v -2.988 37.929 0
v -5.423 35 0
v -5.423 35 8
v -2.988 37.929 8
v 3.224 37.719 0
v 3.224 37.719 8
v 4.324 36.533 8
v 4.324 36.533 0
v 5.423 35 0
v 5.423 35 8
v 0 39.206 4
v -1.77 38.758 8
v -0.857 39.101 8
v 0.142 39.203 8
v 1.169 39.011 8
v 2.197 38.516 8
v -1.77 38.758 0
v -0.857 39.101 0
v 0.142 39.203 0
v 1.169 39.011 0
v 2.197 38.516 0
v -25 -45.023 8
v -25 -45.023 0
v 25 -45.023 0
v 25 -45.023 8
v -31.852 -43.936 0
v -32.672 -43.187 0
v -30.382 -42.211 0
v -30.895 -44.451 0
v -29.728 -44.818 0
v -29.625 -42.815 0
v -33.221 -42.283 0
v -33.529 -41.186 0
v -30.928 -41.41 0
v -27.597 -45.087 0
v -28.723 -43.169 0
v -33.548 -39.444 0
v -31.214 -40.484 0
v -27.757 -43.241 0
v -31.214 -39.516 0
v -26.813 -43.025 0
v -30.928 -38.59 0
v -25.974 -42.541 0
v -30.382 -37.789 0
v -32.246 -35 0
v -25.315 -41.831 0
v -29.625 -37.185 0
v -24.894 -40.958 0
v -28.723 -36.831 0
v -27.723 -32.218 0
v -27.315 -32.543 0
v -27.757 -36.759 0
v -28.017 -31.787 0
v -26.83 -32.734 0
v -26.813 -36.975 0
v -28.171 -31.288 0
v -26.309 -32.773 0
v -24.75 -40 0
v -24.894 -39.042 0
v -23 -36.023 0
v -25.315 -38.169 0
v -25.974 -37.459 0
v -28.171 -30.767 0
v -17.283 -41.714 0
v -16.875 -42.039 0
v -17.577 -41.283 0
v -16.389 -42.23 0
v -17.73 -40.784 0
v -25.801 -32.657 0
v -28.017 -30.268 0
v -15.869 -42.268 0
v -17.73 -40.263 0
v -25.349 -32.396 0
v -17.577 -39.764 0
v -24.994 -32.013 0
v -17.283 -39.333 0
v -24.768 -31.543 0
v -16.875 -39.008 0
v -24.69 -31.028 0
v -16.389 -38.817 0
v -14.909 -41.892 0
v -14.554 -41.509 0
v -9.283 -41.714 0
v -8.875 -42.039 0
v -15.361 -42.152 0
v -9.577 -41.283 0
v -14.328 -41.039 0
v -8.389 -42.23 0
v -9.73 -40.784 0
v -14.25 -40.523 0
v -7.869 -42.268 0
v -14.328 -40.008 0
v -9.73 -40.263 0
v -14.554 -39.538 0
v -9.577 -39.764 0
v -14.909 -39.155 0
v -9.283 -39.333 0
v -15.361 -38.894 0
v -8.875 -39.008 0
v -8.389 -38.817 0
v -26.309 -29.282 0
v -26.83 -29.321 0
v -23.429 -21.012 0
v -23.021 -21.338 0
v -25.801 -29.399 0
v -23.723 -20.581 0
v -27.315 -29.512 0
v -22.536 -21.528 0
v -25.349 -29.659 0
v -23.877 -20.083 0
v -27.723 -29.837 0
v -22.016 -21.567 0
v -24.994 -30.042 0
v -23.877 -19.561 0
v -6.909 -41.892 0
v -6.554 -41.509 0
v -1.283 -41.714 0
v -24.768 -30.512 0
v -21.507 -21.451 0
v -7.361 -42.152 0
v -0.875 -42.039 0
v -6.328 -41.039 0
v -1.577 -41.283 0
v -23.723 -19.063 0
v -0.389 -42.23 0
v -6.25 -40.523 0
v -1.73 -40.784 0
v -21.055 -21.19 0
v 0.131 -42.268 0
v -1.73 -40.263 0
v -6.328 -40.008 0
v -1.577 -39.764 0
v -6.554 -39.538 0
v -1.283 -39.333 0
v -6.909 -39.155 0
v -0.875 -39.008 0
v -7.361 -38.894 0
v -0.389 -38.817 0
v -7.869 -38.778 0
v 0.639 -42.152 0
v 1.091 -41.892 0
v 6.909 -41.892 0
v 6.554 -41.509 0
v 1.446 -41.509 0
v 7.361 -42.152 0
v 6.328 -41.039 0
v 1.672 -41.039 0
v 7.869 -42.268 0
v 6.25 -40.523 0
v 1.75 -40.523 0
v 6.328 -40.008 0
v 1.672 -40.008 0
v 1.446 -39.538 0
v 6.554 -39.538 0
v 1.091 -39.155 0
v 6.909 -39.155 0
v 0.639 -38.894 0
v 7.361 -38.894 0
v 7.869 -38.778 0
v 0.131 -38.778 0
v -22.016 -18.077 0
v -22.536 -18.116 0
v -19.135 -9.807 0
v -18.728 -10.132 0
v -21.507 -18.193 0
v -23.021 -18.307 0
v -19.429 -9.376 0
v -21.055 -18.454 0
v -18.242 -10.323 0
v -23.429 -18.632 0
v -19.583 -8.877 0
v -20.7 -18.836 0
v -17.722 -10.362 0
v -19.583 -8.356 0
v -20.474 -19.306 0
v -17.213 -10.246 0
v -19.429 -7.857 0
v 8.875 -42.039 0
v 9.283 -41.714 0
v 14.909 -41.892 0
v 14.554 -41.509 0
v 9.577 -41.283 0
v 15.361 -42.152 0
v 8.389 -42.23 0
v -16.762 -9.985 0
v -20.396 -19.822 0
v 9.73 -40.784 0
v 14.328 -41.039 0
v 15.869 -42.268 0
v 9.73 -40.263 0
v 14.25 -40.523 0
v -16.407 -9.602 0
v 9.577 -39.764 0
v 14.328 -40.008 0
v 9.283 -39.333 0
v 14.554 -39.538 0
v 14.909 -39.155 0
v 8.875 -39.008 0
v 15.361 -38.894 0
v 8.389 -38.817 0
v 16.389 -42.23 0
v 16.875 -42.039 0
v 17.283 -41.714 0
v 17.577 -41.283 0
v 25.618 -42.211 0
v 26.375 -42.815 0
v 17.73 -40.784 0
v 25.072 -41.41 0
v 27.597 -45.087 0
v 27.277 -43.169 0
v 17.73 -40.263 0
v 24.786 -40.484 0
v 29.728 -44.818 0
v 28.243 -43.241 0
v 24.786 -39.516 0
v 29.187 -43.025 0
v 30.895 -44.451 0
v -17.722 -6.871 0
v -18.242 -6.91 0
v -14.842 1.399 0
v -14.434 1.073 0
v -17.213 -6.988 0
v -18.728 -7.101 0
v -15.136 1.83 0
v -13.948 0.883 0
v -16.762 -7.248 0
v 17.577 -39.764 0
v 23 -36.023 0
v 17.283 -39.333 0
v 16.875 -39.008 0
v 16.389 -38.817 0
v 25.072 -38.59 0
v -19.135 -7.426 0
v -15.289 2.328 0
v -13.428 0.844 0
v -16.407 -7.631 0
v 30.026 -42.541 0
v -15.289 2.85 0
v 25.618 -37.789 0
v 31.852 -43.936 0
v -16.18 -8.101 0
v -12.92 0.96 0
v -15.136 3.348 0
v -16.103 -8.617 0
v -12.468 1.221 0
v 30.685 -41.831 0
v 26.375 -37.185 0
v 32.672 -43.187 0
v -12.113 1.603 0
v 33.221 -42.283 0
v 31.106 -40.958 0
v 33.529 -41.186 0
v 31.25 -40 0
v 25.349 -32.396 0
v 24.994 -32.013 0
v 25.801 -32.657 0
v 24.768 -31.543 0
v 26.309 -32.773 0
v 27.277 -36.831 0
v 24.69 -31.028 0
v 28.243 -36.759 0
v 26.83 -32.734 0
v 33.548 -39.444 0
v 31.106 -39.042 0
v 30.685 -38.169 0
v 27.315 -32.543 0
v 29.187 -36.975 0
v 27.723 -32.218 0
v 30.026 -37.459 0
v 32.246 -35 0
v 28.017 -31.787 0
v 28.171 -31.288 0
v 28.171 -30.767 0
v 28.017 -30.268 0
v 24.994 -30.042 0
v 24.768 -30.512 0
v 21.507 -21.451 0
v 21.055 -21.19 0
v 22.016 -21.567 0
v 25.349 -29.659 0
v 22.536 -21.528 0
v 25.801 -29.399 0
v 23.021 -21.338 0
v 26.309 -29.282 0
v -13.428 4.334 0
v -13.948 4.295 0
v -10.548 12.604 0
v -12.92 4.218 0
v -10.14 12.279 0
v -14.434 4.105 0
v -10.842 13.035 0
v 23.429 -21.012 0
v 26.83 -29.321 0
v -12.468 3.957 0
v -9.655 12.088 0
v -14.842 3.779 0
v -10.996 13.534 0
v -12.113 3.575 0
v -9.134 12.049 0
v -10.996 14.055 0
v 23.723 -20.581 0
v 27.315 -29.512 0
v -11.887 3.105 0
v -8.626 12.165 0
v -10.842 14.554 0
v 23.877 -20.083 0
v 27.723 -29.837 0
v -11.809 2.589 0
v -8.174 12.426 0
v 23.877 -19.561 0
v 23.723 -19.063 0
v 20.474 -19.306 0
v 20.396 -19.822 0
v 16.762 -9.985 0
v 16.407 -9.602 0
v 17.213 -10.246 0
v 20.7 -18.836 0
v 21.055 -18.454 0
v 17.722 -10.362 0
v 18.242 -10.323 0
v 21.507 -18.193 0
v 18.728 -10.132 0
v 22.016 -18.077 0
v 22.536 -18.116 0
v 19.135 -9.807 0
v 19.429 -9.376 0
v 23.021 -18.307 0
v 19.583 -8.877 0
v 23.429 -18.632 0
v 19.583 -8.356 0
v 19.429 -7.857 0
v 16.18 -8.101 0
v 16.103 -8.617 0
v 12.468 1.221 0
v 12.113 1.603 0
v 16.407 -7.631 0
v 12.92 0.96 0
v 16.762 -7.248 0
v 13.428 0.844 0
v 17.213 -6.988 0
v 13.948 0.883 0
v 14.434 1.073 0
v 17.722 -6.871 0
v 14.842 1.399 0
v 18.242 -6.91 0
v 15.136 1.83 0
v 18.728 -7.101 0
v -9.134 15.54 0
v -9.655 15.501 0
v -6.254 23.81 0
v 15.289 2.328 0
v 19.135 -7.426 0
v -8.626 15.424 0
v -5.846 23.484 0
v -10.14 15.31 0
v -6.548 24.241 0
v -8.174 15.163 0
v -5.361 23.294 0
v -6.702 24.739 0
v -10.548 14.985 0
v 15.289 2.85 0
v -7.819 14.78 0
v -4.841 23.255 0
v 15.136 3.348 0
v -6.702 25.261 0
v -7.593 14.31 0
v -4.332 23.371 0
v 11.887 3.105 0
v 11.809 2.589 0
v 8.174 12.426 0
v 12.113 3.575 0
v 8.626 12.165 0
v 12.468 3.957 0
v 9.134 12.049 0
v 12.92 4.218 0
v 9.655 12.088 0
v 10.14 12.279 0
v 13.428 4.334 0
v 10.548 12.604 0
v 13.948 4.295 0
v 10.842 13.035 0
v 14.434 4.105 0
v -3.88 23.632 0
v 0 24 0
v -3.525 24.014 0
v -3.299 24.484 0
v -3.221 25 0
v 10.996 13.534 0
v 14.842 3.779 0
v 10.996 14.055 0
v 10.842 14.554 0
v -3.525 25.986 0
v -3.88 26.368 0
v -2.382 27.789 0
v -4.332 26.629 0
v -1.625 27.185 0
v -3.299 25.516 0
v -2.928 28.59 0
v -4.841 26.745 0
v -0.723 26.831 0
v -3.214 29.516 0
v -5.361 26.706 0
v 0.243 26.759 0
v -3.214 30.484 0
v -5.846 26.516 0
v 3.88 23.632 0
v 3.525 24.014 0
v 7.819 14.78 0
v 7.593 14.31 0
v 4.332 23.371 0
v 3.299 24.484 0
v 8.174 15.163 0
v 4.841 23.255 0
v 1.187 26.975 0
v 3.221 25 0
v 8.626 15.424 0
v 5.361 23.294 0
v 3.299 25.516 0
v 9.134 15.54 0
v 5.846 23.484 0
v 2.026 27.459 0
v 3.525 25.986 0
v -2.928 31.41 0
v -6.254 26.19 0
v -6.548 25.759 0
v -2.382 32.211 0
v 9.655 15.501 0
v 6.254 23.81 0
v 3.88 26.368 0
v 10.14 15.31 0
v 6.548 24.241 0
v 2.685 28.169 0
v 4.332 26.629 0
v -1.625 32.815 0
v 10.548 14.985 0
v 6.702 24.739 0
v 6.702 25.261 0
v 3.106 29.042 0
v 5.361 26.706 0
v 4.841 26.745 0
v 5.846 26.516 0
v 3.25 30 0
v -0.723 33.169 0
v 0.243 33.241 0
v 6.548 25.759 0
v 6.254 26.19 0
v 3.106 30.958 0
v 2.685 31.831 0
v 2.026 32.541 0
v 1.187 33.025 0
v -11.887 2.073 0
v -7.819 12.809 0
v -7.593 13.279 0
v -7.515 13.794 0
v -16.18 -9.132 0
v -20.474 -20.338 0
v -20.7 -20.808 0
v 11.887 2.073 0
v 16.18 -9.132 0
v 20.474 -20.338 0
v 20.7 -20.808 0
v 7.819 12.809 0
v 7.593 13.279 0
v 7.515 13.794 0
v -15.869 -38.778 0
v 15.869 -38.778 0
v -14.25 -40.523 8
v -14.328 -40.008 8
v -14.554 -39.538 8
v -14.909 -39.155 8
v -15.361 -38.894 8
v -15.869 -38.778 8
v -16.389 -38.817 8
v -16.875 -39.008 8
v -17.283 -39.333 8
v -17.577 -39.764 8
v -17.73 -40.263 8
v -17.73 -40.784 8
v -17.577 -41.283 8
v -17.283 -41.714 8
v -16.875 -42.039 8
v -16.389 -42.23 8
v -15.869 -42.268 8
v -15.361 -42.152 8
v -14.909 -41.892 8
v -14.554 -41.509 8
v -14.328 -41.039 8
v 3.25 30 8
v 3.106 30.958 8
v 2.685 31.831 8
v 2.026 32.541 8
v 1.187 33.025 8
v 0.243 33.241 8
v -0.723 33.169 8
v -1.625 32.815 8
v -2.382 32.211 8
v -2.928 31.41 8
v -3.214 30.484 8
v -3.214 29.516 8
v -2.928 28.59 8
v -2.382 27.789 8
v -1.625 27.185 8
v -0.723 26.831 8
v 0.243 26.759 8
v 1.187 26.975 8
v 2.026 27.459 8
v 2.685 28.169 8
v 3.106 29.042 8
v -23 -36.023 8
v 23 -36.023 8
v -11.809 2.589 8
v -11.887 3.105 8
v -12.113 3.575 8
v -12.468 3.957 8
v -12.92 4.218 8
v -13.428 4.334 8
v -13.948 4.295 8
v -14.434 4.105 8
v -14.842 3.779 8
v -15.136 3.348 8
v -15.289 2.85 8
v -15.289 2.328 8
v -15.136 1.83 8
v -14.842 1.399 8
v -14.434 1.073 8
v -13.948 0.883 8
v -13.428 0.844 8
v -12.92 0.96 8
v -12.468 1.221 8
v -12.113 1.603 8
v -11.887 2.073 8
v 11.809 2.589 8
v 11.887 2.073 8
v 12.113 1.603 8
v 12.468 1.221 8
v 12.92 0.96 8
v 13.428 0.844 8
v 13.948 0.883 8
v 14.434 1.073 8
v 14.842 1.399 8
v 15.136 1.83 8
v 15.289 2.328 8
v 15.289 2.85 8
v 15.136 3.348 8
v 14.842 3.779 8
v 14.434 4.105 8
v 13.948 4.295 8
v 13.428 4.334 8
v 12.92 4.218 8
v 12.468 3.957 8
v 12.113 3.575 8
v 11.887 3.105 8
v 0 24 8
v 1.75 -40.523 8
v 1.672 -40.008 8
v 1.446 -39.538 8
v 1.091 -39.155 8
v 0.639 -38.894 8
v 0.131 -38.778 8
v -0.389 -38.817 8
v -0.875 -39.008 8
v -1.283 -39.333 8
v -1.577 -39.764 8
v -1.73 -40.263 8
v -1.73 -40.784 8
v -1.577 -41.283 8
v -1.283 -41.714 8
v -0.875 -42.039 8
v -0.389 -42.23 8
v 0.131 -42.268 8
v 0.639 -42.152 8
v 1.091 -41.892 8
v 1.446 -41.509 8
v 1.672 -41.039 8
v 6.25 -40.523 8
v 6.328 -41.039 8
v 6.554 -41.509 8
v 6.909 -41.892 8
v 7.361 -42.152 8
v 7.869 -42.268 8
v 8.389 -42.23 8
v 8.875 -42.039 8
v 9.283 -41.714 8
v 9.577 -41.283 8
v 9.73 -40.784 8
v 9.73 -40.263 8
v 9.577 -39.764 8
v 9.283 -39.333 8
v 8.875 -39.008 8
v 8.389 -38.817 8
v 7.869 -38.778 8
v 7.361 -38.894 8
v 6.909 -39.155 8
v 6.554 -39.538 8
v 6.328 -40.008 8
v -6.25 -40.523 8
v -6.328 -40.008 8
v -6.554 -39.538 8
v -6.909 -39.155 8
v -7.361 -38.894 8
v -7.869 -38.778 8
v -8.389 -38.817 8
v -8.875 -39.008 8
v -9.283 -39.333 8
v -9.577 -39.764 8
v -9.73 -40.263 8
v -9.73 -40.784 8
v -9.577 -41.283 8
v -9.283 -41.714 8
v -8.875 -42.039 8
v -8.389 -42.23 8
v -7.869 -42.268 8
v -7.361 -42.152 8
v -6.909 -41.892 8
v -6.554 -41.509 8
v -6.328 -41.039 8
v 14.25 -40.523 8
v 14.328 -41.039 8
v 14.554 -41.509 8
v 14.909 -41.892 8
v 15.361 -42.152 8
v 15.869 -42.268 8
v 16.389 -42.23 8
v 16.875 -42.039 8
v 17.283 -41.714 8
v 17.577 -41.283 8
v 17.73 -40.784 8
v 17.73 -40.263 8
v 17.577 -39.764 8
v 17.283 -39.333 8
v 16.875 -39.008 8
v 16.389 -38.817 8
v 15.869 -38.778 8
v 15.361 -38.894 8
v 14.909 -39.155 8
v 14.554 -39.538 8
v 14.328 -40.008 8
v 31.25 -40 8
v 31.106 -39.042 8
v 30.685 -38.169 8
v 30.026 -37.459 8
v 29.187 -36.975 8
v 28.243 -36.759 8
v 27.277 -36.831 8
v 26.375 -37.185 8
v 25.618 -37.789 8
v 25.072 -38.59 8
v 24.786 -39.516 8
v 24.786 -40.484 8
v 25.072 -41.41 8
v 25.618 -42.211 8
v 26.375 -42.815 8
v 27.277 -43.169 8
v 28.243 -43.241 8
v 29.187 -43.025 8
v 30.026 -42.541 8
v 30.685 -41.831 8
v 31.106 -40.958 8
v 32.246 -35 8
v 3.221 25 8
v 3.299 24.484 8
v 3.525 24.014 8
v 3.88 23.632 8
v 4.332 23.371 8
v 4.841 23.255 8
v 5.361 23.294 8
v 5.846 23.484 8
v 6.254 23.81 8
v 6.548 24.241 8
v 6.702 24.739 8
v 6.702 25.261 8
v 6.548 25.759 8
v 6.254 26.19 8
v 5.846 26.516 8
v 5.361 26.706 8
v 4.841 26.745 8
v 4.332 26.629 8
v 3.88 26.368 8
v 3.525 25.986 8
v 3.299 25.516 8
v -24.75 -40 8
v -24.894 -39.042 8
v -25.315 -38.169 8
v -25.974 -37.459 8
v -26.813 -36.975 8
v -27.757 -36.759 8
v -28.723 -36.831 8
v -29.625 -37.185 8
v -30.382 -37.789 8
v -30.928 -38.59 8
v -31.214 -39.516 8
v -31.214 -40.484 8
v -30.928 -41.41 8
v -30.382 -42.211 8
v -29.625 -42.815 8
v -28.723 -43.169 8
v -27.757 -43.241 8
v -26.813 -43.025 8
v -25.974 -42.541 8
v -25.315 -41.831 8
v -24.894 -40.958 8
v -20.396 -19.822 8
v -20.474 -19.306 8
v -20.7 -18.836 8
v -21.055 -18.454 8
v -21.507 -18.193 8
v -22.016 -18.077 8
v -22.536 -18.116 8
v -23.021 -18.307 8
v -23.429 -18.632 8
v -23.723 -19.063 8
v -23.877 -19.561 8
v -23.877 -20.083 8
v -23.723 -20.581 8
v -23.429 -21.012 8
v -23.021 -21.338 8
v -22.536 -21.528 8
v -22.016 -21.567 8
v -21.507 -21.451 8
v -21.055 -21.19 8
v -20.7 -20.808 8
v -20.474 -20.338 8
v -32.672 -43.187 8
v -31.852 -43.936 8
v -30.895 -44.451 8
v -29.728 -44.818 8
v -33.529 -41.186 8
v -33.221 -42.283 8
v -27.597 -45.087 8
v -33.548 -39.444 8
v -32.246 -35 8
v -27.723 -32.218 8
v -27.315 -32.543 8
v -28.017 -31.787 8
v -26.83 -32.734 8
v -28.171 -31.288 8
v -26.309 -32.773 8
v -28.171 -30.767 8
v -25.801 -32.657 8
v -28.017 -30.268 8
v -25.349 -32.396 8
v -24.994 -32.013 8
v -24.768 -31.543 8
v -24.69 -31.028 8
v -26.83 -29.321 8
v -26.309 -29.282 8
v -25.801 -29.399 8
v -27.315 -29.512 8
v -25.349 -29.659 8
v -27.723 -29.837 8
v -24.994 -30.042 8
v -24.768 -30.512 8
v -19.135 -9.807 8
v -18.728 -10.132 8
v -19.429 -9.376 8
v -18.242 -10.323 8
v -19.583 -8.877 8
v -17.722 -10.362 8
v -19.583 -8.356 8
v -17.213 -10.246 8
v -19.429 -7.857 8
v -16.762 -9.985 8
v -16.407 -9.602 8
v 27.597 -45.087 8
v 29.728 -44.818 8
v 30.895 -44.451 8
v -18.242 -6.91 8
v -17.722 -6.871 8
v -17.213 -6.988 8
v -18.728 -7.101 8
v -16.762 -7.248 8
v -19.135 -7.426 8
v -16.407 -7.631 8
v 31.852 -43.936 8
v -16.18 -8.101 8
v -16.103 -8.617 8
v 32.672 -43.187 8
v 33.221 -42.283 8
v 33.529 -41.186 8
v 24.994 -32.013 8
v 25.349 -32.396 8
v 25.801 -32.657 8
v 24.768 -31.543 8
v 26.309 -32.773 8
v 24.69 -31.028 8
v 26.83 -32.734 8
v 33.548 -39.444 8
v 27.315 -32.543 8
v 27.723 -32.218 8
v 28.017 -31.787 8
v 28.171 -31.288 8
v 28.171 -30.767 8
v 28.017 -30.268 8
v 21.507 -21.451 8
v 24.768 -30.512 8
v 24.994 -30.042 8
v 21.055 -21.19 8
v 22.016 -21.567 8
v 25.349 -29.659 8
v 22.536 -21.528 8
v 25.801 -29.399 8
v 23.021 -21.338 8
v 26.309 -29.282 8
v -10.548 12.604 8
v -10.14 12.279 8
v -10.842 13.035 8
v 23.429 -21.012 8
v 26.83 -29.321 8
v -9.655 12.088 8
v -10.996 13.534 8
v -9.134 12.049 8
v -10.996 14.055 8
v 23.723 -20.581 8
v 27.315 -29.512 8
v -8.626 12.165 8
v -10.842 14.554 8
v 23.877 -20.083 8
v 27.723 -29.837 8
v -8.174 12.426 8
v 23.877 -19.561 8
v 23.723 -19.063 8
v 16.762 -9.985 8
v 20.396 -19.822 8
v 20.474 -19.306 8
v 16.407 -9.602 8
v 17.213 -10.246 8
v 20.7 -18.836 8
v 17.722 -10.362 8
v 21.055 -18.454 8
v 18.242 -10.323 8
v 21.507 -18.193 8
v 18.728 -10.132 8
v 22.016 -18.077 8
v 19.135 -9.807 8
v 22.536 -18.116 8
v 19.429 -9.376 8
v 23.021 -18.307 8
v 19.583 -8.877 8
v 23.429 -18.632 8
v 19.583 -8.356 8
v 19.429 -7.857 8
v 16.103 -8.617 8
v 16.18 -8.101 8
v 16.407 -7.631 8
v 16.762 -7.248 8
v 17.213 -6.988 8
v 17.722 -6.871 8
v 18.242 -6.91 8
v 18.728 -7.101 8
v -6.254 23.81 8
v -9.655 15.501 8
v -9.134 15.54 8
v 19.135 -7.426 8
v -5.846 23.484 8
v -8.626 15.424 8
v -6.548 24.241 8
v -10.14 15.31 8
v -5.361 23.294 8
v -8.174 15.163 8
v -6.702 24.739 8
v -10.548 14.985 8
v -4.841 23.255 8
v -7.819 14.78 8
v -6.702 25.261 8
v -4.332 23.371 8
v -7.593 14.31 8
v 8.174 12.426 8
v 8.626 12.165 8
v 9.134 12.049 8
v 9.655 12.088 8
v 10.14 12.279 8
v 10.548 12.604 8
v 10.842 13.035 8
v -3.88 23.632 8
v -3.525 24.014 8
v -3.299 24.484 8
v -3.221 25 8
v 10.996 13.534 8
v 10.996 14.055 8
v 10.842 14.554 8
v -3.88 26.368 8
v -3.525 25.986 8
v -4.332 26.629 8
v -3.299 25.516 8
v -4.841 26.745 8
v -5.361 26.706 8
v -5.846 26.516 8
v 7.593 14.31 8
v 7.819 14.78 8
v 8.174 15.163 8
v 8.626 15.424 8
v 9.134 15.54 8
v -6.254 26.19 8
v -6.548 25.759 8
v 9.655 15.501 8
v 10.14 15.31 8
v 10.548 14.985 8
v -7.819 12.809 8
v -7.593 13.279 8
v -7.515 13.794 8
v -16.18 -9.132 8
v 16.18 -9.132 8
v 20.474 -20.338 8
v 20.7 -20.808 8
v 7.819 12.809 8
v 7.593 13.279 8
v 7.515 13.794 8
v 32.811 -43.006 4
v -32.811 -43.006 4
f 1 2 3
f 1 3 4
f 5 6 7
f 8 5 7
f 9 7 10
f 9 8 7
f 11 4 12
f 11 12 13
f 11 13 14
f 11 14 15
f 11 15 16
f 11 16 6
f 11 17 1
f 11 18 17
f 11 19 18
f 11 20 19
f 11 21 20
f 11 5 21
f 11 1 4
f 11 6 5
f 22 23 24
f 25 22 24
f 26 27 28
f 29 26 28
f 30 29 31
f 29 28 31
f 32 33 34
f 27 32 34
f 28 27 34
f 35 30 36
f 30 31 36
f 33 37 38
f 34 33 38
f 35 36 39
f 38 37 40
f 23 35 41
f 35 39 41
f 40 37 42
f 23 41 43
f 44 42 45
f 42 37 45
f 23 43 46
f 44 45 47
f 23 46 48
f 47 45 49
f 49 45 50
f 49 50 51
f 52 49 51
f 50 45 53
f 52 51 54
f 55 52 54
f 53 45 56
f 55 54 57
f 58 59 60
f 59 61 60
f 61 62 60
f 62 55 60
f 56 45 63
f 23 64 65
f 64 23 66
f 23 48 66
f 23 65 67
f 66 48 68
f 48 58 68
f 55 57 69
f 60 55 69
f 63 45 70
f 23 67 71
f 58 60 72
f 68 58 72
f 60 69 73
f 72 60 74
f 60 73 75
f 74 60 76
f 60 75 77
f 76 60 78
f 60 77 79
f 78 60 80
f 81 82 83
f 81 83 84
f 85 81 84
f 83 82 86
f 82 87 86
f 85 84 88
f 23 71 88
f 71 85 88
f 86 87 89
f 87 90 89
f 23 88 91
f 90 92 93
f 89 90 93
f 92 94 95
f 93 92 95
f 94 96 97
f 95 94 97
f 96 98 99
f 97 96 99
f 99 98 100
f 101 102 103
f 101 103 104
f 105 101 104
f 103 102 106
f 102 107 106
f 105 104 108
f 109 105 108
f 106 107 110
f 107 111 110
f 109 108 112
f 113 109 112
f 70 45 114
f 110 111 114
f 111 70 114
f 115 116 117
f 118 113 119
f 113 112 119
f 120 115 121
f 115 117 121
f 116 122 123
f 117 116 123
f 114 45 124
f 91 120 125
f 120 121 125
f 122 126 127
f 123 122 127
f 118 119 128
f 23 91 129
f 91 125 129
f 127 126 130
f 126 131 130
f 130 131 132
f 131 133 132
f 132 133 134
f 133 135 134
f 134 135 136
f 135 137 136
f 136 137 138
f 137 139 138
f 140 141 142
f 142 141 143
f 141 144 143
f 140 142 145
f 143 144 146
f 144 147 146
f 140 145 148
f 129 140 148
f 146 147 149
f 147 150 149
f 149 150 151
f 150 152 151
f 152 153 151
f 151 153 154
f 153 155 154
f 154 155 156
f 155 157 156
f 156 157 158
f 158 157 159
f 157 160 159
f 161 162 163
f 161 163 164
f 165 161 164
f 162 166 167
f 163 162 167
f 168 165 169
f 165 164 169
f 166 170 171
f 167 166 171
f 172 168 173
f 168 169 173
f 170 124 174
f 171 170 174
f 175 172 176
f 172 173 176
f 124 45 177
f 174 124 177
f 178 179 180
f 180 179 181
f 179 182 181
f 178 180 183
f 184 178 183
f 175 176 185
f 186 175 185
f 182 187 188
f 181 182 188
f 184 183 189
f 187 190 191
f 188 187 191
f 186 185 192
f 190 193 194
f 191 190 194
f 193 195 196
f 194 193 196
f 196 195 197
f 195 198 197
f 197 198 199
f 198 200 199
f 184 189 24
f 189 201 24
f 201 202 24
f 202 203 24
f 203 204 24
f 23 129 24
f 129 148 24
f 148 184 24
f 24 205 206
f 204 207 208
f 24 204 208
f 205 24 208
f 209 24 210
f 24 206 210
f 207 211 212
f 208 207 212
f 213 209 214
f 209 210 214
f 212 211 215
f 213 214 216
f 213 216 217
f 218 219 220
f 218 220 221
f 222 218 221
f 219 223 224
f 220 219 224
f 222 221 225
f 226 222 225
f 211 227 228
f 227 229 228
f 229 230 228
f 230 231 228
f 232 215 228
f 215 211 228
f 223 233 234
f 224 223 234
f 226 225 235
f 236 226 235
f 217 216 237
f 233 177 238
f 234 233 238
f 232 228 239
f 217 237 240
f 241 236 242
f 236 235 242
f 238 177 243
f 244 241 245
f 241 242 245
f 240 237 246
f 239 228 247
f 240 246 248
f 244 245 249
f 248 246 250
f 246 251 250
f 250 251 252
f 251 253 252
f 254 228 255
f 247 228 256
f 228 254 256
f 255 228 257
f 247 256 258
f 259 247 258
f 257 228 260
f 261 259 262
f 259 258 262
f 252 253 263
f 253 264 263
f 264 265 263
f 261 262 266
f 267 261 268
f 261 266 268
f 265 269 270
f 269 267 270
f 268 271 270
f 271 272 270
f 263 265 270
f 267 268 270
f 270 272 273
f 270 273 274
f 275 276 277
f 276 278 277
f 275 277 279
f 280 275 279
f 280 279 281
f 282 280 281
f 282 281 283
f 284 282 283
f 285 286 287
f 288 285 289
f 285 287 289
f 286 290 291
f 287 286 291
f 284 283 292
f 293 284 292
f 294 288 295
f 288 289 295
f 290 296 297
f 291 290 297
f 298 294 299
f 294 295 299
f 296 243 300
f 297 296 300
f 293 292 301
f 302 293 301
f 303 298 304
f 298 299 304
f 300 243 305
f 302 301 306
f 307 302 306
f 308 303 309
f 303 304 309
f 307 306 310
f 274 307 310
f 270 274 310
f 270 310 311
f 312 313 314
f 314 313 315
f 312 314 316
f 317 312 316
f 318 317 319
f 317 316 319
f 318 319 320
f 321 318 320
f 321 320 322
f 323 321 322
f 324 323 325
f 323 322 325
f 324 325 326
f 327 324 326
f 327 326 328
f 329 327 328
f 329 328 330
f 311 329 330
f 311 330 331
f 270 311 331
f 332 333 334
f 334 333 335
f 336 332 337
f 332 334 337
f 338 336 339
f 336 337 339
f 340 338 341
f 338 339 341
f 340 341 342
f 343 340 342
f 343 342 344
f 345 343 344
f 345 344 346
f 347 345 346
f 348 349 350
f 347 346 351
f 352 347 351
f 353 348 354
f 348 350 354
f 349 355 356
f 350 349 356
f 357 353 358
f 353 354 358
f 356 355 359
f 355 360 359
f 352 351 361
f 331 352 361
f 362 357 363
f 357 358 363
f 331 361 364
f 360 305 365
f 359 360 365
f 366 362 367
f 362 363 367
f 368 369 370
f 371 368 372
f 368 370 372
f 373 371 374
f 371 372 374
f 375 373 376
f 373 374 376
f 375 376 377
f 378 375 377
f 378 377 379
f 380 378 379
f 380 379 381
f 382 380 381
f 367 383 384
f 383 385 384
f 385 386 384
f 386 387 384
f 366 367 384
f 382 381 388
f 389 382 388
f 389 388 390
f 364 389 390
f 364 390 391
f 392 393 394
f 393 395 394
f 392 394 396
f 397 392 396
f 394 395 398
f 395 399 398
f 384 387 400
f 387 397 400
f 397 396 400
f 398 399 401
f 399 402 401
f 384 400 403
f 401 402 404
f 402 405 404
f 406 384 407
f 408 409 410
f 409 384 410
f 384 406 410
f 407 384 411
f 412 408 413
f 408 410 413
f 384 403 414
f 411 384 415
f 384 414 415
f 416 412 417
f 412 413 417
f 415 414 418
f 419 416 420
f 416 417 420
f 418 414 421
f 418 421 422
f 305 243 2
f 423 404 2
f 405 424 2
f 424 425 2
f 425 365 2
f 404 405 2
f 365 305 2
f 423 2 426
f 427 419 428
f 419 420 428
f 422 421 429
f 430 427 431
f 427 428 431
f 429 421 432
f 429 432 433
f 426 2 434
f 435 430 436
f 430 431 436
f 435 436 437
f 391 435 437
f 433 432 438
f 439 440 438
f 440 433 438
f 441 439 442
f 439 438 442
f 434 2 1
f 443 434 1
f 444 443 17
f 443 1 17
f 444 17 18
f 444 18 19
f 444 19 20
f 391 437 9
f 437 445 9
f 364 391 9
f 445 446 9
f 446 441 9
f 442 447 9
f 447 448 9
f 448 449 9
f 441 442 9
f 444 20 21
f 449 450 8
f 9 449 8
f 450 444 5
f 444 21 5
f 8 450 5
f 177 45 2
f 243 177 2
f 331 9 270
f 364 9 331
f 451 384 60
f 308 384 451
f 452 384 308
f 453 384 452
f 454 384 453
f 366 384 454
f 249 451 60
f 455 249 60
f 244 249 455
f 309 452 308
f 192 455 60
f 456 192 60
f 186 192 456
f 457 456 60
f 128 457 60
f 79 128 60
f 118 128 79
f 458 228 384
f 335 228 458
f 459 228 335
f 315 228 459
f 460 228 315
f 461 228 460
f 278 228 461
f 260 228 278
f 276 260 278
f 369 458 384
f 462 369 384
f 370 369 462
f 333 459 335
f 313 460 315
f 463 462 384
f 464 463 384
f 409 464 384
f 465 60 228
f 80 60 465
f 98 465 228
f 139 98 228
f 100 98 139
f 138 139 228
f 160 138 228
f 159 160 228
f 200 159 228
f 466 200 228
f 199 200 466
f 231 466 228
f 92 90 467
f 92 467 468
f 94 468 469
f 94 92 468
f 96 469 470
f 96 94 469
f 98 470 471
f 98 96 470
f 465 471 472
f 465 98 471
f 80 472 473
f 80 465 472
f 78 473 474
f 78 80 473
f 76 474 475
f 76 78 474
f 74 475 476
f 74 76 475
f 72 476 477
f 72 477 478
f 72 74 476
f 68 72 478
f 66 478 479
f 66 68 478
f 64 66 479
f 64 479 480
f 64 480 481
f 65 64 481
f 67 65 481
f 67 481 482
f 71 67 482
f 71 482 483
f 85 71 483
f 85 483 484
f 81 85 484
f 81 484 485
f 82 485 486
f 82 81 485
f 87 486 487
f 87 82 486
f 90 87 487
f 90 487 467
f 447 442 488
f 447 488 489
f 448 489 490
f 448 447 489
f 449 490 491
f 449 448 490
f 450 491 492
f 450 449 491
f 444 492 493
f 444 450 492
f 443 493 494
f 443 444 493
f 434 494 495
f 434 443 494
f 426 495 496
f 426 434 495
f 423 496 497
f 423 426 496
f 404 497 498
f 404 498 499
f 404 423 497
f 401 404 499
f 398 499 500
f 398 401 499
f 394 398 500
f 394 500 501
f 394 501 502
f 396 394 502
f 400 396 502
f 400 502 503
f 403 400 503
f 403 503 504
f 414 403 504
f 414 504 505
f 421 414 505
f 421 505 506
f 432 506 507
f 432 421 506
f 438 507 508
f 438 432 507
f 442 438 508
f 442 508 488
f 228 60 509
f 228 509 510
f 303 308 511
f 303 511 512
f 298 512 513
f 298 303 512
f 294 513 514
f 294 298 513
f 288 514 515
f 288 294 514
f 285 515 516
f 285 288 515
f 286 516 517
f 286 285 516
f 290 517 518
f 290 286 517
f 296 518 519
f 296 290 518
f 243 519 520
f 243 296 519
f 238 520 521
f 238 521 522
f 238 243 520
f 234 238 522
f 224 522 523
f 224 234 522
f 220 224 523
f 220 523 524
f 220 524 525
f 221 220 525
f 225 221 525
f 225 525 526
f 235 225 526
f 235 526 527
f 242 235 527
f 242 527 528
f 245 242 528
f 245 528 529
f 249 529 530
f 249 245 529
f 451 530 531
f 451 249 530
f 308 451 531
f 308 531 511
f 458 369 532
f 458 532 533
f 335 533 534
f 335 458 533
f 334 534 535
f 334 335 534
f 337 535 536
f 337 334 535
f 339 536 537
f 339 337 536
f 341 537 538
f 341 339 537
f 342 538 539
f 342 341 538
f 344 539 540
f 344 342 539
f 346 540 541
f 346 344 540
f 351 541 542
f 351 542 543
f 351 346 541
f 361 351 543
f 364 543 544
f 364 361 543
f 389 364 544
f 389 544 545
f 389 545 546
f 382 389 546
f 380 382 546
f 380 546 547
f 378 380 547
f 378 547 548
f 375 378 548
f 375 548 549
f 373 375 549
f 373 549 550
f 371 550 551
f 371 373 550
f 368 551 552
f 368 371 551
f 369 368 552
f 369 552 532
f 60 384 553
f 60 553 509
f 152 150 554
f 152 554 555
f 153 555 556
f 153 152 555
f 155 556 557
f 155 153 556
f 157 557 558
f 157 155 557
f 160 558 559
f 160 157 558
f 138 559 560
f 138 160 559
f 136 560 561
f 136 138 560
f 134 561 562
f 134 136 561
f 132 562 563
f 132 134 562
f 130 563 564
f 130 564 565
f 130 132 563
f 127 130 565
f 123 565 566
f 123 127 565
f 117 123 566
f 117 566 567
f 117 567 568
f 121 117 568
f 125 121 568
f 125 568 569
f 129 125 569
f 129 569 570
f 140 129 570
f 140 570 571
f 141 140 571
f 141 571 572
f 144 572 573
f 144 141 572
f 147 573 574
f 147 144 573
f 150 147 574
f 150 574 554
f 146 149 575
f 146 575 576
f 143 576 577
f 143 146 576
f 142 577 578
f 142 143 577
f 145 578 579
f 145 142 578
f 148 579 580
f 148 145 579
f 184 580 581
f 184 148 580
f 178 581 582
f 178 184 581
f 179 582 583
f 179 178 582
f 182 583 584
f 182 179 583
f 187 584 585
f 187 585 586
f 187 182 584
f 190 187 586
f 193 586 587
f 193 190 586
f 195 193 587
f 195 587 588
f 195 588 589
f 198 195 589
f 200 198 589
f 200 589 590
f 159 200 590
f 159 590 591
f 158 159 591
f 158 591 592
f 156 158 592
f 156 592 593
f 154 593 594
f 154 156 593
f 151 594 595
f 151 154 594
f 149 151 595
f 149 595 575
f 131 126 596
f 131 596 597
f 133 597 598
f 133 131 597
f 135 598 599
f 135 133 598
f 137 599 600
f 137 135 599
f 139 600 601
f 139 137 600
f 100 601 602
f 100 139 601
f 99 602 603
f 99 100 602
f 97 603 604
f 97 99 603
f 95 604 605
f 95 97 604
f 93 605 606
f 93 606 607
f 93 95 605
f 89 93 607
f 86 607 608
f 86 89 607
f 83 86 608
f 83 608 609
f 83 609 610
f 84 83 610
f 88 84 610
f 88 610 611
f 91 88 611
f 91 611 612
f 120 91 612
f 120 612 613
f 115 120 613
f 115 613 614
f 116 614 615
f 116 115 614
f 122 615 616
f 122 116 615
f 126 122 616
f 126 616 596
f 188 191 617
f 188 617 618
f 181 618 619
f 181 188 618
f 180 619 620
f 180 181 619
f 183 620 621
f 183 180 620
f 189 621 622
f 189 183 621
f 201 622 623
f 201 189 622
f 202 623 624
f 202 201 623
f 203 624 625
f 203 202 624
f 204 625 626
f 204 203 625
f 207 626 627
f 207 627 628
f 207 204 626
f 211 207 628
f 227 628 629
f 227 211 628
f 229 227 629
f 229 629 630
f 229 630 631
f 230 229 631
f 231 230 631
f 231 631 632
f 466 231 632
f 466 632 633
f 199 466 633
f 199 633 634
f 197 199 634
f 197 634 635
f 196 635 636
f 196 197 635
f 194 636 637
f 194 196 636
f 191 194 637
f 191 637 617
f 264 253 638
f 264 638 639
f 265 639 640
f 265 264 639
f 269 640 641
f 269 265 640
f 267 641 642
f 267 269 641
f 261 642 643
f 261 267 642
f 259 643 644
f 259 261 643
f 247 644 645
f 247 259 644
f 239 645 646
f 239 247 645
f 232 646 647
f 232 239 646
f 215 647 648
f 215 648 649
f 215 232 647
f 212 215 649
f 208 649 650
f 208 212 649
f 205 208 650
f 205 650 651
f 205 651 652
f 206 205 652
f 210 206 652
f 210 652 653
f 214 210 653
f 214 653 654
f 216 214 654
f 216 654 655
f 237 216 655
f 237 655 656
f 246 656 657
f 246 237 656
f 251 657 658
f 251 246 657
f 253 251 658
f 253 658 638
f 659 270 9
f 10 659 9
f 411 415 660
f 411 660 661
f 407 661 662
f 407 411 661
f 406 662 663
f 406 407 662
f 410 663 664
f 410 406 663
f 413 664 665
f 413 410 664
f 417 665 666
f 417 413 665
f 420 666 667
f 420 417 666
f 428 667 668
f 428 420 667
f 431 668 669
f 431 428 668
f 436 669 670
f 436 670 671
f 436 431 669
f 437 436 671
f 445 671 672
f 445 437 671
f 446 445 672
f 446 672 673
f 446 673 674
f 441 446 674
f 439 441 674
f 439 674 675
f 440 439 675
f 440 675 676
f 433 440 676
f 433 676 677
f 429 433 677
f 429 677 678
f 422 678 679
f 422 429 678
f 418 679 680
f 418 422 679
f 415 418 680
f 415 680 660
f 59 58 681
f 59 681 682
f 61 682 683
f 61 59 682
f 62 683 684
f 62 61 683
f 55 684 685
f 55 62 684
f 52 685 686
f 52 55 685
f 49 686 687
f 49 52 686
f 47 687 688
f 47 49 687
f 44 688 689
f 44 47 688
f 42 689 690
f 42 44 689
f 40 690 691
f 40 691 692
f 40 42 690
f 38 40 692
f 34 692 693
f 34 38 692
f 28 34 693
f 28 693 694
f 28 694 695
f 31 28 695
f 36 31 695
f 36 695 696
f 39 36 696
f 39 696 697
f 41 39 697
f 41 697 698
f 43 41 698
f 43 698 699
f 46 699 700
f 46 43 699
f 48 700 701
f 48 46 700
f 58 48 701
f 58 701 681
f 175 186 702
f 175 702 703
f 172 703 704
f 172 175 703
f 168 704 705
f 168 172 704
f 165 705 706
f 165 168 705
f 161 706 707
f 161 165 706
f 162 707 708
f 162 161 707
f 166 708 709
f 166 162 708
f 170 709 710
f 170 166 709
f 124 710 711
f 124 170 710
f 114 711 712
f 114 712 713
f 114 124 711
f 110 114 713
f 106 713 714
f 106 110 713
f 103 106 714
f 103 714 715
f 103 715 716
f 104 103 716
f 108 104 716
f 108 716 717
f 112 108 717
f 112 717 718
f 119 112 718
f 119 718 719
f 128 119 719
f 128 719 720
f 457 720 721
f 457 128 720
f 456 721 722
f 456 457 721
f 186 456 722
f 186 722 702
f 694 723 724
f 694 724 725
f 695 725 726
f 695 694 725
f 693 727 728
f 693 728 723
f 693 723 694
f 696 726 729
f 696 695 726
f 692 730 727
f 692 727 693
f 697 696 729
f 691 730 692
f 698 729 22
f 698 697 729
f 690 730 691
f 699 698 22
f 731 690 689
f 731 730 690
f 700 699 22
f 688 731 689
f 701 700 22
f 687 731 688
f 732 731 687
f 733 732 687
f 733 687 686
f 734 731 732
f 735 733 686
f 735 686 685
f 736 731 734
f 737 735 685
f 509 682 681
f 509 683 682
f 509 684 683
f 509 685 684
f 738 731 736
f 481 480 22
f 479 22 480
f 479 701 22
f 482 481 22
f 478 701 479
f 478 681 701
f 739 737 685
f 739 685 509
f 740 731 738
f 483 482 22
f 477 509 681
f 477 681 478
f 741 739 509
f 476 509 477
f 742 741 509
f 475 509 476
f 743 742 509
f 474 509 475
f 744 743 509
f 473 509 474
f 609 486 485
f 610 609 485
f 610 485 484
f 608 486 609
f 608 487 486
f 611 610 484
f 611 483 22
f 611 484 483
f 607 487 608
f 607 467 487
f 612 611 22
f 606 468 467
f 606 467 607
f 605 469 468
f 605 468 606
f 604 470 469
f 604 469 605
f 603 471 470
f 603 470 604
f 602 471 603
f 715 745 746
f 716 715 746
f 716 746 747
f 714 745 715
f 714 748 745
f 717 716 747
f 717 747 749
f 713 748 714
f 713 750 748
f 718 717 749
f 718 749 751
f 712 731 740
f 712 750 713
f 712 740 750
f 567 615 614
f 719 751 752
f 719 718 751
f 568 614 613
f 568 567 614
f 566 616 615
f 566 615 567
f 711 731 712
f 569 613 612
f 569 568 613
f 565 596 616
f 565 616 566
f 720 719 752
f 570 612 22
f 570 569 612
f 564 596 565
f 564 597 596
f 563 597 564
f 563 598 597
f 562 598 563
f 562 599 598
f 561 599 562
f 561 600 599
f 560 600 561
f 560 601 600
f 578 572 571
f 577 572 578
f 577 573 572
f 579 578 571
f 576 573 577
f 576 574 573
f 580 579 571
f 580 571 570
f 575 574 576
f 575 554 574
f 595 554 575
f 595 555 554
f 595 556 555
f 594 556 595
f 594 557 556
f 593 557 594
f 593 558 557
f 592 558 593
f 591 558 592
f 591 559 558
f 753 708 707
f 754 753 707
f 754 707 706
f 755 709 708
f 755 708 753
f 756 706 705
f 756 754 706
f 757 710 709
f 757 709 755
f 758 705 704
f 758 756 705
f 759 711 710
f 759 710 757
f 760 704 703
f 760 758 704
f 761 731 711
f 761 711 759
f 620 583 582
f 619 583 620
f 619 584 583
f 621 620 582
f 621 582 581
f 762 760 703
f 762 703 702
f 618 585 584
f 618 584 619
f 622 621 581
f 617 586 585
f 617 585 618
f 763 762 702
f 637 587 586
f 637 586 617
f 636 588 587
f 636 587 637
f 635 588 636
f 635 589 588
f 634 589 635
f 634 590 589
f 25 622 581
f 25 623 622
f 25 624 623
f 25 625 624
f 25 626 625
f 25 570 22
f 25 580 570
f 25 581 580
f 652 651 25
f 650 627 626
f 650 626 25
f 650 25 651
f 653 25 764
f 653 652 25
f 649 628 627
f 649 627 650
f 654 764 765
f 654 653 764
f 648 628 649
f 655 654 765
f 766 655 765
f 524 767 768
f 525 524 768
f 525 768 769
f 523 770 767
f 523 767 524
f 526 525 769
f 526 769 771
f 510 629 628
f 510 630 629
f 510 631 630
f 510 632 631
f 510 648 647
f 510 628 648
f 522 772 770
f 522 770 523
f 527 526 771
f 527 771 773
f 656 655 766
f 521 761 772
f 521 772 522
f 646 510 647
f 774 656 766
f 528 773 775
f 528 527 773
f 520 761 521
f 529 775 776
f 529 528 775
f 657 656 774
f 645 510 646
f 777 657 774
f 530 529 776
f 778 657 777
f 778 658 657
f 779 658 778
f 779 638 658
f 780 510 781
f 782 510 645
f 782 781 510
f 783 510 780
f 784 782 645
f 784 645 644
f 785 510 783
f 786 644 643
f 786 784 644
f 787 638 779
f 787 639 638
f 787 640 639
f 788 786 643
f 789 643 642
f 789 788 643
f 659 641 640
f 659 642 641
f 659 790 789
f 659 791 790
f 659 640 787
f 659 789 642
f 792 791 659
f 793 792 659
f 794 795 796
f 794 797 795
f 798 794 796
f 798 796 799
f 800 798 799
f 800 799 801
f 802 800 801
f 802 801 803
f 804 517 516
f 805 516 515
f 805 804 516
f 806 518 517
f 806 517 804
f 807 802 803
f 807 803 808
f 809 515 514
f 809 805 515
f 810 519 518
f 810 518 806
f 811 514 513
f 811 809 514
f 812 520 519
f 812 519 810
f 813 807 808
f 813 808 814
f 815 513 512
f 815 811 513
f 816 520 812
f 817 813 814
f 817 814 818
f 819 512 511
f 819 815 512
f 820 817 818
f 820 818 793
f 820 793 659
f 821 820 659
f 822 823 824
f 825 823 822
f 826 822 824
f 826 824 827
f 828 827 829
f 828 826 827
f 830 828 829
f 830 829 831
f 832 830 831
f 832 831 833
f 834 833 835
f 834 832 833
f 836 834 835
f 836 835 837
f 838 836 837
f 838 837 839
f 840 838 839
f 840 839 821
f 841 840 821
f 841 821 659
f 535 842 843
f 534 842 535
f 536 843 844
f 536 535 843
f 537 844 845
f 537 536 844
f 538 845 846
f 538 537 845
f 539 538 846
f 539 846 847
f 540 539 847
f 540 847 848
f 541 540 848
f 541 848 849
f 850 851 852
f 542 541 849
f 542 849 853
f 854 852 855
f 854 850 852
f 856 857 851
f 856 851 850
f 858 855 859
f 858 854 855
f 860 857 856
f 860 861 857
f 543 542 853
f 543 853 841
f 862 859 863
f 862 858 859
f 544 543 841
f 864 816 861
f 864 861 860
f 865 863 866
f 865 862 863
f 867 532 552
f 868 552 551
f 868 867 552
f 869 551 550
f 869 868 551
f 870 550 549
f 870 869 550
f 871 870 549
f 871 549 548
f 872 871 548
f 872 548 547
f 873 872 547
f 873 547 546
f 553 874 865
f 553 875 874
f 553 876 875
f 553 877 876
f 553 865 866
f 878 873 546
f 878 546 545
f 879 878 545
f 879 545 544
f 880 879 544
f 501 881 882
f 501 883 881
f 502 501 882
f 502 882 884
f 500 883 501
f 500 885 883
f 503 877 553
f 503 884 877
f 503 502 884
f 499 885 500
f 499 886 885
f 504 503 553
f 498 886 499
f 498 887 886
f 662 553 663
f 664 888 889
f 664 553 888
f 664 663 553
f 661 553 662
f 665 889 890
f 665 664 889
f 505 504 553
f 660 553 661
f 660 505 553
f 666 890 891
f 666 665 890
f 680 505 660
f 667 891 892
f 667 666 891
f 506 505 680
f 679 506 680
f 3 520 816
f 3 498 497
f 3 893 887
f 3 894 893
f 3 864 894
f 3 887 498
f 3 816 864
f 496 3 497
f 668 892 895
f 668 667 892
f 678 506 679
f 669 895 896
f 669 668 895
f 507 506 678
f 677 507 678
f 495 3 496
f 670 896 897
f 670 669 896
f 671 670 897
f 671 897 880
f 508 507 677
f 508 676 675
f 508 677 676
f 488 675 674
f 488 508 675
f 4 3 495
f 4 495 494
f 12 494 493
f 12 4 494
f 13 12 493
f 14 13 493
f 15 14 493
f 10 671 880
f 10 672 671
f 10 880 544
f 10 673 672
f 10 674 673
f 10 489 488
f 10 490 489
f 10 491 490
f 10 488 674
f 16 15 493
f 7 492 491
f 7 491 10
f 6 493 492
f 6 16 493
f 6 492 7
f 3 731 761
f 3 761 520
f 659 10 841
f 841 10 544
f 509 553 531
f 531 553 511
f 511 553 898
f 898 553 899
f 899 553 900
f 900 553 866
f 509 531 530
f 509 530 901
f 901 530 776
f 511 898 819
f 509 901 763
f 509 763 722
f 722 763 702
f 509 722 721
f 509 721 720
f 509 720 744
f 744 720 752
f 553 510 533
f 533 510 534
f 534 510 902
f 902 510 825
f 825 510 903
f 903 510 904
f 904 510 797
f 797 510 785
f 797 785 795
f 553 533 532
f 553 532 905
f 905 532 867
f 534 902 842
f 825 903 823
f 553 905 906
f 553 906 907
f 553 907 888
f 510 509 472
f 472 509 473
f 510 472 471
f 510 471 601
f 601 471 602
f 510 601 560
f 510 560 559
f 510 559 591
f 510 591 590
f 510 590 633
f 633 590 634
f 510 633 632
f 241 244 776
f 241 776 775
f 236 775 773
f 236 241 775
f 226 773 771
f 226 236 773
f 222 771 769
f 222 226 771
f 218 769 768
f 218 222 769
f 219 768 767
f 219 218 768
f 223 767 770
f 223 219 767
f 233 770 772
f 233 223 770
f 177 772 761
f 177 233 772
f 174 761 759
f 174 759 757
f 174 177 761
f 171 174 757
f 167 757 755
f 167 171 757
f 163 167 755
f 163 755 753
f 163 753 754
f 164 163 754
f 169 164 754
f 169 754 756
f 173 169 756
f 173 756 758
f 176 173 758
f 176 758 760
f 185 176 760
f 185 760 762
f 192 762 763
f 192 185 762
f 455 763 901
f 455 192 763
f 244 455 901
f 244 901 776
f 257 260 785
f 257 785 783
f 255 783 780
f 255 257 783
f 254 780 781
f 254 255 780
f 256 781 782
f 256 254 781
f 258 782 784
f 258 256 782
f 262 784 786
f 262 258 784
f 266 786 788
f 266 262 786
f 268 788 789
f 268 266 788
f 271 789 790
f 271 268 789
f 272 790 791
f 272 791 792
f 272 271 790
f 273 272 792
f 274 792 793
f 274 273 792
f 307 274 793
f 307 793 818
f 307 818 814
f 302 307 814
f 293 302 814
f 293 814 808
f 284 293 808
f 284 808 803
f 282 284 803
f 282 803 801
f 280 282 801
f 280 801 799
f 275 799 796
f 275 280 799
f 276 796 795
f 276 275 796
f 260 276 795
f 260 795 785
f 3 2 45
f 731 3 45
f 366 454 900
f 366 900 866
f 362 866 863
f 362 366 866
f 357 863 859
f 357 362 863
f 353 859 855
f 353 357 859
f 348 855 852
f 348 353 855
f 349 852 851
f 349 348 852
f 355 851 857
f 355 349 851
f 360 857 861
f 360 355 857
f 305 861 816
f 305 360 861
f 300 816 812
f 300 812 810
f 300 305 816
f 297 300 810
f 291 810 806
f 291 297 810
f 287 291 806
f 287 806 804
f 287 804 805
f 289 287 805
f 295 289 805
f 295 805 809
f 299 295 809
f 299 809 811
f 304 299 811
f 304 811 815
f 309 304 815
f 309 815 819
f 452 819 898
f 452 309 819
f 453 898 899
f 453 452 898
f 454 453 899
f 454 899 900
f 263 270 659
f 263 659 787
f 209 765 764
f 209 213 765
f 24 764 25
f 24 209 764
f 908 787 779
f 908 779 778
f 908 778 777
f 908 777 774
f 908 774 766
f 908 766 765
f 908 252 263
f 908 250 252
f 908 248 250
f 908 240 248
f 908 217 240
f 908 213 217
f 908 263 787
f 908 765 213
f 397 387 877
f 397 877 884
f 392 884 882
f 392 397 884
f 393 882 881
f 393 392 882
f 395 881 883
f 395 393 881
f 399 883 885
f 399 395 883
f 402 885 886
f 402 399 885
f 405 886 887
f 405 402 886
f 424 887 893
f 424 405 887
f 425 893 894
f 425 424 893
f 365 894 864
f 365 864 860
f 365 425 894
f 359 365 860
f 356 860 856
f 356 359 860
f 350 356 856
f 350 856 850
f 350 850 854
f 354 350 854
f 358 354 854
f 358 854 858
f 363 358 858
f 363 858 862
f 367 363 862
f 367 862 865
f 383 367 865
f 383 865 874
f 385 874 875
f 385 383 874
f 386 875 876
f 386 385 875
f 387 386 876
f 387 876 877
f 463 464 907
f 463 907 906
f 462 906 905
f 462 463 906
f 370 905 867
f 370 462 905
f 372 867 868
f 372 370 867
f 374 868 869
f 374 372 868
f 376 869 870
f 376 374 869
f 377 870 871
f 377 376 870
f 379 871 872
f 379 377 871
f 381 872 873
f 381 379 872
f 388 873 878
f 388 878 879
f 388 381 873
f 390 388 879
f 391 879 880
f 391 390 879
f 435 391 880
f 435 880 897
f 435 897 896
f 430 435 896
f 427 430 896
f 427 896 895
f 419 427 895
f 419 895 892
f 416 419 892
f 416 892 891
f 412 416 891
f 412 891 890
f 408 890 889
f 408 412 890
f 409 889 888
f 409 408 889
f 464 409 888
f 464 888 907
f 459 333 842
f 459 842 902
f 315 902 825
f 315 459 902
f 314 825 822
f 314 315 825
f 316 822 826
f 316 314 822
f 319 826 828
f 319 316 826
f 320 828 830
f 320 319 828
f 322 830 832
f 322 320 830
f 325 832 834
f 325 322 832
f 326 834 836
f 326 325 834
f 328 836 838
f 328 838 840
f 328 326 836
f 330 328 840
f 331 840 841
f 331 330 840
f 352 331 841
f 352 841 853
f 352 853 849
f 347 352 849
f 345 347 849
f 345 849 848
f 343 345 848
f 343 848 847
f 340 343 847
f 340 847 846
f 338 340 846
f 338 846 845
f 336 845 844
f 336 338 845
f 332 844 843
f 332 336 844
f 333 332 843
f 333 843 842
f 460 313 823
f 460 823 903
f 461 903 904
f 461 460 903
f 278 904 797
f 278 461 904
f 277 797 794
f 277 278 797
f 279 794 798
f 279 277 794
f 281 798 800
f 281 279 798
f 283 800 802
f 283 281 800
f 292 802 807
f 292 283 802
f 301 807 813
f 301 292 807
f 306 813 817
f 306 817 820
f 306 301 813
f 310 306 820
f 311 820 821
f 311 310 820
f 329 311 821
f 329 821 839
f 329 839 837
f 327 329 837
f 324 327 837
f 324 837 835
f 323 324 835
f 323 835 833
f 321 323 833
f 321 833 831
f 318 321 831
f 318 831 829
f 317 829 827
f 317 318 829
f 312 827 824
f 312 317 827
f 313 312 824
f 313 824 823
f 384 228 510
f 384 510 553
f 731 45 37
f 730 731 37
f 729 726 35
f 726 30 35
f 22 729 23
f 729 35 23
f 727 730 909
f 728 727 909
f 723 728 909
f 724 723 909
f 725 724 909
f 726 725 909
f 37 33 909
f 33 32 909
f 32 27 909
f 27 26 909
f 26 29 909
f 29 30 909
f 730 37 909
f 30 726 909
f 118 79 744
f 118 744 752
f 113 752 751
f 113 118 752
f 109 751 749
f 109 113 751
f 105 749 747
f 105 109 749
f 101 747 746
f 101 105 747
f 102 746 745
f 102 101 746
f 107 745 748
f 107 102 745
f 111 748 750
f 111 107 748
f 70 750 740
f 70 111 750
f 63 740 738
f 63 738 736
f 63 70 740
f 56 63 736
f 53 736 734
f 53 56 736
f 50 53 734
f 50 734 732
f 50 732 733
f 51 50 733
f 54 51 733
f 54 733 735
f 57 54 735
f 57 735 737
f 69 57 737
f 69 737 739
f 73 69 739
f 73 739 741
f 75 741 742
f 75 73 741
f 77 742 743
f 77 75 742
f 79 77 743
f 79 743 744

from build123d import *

# Parameters (mm, degrees)
SKETCH_1_R      = 3.25
SKETCH_1_R_2    = 1.75
EXTRUDE_1_DEPTH = 8


with BuildPart() as part:
    # 草圖1 → 填料-伸長1 (new body)
    with BuildSketch(Plane.XY):
        with BuildLine():
            Line((-5.423089748, 35), (-32.24596582, -35))
            add(Edge.make_bspline(
                [(-32.24596582, -35), (-37, -46), (-25, -45.023391813)],
                knots=[0, 0, 0, 1, 1, 1], degree=2))
            Line((-25, -45.023391813), (25, -45.023391813))
            add(Edge.make_bspline(
                [(32.24596582, -35), (37, -46), (25, -45.023391813)],
                knots=[0, 0, 0, 1, 1, 1], degree=2))
            Line((32.24596582, -35), (5.423089748, 35))
            add(Edge.make_bspline(
                [(-5.423089748, 35), (0, 43.412192281), (5.423089748, 35)],
                knots=[0, 0, 0, 1, 1, 1], degree=2))
        make_face()
        with Locations((0, 30)):
            Circle(SKETCH_1_R, mode=Mode.SUBTRACT)
        with Locations((-28, -40)):
            Circle(SKETCH_1_R, mode=Mode.SUBTRACT)
        with Locations((28, -40)):
            Circle(SKETCH_1_R, mode=Mode.SUBTRACT)
        with Locations((-4.971323351, 25)):
            Circle(SKETCH_1_R_2, mode=Mode.SUBTRACT)
        with Locations((-9.265095937, 13.794487206)):
            Circle(SKETCH_1_R_2, mode=Mode.SUBTRACT)
        with Locations((-13.558868522, 2.588974411)):
            Circle(SKETCH_1_R_2, mode=Mode.SUBTRACT)
        with Locations((-17.852641108, -8.616538383)):
            Circle(SKETCH_1_R_2, mode=Mode.SUBTRACT)
        with Locations((-22.146413694, -19.822051177)):
            Circle(SKETCH_1_R_2, mode=Mode.SUBTRACT)
        with Locations((-26.44018628, -31.027563971)):
            Circle(SKETCH_1_R_2, mode=Mode.SUBTRACT)
        with Locations((-16, -40.523391813)):
            Circle(SKETCH_1_R_2, mode=Mode.SUBTRACT)
        with Locations((-8, -40.523391813)):
            Circle(SKETCH_1_R_2, mode=Mode.SUBTRACT)
        with Locations((0, -40.523391813)):
            Circle(SKETCH_1_R_2, mode=Mode.SUBTRACT)
        with Locations(Location((8, -40.523391813, 0), (0, 0, 180))):
            Circle(SKETCH_1_R_2, mode=Mode.SUBTRACT)
        with Locations(Location((16, -40.523391813, 0), (0, 0, 180))):
            Circle(SKETCH_1_R_2, mode=Mode.SUBTRACT)
        with Locations(Location((26.44018628, -31.027563971, 0), (0, 0, 180))):
            Circle(SKETCH_1_R_2, mode=Mode.SUBTRACT)
        with Locations(Location((22.146413694, -19.822051177, 0), (0, 0, 180))):
            Circle(SKETCH_1_R_2, mode=Mode.SUBTRACT)
        with Locations(Location((17.852641108, -8.616538383, 0), (0, 0, 180))):
            Circle(SKETCH_1_R_2, mode=Mode.SUBTRACT)
        with Locations(Location((13.558868522, 2.588974411, 0), (0, 0, 180))):
            Circle(SKETCH_1_R_2, mode=Mode.SUBTRACT)
        with Locations(Location((9.265095937, 13.794487206, 0), (0, 0, 180))):
            Circle(SKETCH_1_R_2, mode=Mode.SUBTRACT)
        with Locations(Location((4.971323351, 25, 0), (0, 0, 180))):
            Circle(SKETCH_1_R_2, mode=Mode.SUBTRACT)
        Polygon((0, 24), (-23, -36.023391813), (23, -36.023391813), align=None, mode=Mode.SUBTRACT)
    extrude(amount=EXTRUDE_1_DEPTH)


solid = part.part
